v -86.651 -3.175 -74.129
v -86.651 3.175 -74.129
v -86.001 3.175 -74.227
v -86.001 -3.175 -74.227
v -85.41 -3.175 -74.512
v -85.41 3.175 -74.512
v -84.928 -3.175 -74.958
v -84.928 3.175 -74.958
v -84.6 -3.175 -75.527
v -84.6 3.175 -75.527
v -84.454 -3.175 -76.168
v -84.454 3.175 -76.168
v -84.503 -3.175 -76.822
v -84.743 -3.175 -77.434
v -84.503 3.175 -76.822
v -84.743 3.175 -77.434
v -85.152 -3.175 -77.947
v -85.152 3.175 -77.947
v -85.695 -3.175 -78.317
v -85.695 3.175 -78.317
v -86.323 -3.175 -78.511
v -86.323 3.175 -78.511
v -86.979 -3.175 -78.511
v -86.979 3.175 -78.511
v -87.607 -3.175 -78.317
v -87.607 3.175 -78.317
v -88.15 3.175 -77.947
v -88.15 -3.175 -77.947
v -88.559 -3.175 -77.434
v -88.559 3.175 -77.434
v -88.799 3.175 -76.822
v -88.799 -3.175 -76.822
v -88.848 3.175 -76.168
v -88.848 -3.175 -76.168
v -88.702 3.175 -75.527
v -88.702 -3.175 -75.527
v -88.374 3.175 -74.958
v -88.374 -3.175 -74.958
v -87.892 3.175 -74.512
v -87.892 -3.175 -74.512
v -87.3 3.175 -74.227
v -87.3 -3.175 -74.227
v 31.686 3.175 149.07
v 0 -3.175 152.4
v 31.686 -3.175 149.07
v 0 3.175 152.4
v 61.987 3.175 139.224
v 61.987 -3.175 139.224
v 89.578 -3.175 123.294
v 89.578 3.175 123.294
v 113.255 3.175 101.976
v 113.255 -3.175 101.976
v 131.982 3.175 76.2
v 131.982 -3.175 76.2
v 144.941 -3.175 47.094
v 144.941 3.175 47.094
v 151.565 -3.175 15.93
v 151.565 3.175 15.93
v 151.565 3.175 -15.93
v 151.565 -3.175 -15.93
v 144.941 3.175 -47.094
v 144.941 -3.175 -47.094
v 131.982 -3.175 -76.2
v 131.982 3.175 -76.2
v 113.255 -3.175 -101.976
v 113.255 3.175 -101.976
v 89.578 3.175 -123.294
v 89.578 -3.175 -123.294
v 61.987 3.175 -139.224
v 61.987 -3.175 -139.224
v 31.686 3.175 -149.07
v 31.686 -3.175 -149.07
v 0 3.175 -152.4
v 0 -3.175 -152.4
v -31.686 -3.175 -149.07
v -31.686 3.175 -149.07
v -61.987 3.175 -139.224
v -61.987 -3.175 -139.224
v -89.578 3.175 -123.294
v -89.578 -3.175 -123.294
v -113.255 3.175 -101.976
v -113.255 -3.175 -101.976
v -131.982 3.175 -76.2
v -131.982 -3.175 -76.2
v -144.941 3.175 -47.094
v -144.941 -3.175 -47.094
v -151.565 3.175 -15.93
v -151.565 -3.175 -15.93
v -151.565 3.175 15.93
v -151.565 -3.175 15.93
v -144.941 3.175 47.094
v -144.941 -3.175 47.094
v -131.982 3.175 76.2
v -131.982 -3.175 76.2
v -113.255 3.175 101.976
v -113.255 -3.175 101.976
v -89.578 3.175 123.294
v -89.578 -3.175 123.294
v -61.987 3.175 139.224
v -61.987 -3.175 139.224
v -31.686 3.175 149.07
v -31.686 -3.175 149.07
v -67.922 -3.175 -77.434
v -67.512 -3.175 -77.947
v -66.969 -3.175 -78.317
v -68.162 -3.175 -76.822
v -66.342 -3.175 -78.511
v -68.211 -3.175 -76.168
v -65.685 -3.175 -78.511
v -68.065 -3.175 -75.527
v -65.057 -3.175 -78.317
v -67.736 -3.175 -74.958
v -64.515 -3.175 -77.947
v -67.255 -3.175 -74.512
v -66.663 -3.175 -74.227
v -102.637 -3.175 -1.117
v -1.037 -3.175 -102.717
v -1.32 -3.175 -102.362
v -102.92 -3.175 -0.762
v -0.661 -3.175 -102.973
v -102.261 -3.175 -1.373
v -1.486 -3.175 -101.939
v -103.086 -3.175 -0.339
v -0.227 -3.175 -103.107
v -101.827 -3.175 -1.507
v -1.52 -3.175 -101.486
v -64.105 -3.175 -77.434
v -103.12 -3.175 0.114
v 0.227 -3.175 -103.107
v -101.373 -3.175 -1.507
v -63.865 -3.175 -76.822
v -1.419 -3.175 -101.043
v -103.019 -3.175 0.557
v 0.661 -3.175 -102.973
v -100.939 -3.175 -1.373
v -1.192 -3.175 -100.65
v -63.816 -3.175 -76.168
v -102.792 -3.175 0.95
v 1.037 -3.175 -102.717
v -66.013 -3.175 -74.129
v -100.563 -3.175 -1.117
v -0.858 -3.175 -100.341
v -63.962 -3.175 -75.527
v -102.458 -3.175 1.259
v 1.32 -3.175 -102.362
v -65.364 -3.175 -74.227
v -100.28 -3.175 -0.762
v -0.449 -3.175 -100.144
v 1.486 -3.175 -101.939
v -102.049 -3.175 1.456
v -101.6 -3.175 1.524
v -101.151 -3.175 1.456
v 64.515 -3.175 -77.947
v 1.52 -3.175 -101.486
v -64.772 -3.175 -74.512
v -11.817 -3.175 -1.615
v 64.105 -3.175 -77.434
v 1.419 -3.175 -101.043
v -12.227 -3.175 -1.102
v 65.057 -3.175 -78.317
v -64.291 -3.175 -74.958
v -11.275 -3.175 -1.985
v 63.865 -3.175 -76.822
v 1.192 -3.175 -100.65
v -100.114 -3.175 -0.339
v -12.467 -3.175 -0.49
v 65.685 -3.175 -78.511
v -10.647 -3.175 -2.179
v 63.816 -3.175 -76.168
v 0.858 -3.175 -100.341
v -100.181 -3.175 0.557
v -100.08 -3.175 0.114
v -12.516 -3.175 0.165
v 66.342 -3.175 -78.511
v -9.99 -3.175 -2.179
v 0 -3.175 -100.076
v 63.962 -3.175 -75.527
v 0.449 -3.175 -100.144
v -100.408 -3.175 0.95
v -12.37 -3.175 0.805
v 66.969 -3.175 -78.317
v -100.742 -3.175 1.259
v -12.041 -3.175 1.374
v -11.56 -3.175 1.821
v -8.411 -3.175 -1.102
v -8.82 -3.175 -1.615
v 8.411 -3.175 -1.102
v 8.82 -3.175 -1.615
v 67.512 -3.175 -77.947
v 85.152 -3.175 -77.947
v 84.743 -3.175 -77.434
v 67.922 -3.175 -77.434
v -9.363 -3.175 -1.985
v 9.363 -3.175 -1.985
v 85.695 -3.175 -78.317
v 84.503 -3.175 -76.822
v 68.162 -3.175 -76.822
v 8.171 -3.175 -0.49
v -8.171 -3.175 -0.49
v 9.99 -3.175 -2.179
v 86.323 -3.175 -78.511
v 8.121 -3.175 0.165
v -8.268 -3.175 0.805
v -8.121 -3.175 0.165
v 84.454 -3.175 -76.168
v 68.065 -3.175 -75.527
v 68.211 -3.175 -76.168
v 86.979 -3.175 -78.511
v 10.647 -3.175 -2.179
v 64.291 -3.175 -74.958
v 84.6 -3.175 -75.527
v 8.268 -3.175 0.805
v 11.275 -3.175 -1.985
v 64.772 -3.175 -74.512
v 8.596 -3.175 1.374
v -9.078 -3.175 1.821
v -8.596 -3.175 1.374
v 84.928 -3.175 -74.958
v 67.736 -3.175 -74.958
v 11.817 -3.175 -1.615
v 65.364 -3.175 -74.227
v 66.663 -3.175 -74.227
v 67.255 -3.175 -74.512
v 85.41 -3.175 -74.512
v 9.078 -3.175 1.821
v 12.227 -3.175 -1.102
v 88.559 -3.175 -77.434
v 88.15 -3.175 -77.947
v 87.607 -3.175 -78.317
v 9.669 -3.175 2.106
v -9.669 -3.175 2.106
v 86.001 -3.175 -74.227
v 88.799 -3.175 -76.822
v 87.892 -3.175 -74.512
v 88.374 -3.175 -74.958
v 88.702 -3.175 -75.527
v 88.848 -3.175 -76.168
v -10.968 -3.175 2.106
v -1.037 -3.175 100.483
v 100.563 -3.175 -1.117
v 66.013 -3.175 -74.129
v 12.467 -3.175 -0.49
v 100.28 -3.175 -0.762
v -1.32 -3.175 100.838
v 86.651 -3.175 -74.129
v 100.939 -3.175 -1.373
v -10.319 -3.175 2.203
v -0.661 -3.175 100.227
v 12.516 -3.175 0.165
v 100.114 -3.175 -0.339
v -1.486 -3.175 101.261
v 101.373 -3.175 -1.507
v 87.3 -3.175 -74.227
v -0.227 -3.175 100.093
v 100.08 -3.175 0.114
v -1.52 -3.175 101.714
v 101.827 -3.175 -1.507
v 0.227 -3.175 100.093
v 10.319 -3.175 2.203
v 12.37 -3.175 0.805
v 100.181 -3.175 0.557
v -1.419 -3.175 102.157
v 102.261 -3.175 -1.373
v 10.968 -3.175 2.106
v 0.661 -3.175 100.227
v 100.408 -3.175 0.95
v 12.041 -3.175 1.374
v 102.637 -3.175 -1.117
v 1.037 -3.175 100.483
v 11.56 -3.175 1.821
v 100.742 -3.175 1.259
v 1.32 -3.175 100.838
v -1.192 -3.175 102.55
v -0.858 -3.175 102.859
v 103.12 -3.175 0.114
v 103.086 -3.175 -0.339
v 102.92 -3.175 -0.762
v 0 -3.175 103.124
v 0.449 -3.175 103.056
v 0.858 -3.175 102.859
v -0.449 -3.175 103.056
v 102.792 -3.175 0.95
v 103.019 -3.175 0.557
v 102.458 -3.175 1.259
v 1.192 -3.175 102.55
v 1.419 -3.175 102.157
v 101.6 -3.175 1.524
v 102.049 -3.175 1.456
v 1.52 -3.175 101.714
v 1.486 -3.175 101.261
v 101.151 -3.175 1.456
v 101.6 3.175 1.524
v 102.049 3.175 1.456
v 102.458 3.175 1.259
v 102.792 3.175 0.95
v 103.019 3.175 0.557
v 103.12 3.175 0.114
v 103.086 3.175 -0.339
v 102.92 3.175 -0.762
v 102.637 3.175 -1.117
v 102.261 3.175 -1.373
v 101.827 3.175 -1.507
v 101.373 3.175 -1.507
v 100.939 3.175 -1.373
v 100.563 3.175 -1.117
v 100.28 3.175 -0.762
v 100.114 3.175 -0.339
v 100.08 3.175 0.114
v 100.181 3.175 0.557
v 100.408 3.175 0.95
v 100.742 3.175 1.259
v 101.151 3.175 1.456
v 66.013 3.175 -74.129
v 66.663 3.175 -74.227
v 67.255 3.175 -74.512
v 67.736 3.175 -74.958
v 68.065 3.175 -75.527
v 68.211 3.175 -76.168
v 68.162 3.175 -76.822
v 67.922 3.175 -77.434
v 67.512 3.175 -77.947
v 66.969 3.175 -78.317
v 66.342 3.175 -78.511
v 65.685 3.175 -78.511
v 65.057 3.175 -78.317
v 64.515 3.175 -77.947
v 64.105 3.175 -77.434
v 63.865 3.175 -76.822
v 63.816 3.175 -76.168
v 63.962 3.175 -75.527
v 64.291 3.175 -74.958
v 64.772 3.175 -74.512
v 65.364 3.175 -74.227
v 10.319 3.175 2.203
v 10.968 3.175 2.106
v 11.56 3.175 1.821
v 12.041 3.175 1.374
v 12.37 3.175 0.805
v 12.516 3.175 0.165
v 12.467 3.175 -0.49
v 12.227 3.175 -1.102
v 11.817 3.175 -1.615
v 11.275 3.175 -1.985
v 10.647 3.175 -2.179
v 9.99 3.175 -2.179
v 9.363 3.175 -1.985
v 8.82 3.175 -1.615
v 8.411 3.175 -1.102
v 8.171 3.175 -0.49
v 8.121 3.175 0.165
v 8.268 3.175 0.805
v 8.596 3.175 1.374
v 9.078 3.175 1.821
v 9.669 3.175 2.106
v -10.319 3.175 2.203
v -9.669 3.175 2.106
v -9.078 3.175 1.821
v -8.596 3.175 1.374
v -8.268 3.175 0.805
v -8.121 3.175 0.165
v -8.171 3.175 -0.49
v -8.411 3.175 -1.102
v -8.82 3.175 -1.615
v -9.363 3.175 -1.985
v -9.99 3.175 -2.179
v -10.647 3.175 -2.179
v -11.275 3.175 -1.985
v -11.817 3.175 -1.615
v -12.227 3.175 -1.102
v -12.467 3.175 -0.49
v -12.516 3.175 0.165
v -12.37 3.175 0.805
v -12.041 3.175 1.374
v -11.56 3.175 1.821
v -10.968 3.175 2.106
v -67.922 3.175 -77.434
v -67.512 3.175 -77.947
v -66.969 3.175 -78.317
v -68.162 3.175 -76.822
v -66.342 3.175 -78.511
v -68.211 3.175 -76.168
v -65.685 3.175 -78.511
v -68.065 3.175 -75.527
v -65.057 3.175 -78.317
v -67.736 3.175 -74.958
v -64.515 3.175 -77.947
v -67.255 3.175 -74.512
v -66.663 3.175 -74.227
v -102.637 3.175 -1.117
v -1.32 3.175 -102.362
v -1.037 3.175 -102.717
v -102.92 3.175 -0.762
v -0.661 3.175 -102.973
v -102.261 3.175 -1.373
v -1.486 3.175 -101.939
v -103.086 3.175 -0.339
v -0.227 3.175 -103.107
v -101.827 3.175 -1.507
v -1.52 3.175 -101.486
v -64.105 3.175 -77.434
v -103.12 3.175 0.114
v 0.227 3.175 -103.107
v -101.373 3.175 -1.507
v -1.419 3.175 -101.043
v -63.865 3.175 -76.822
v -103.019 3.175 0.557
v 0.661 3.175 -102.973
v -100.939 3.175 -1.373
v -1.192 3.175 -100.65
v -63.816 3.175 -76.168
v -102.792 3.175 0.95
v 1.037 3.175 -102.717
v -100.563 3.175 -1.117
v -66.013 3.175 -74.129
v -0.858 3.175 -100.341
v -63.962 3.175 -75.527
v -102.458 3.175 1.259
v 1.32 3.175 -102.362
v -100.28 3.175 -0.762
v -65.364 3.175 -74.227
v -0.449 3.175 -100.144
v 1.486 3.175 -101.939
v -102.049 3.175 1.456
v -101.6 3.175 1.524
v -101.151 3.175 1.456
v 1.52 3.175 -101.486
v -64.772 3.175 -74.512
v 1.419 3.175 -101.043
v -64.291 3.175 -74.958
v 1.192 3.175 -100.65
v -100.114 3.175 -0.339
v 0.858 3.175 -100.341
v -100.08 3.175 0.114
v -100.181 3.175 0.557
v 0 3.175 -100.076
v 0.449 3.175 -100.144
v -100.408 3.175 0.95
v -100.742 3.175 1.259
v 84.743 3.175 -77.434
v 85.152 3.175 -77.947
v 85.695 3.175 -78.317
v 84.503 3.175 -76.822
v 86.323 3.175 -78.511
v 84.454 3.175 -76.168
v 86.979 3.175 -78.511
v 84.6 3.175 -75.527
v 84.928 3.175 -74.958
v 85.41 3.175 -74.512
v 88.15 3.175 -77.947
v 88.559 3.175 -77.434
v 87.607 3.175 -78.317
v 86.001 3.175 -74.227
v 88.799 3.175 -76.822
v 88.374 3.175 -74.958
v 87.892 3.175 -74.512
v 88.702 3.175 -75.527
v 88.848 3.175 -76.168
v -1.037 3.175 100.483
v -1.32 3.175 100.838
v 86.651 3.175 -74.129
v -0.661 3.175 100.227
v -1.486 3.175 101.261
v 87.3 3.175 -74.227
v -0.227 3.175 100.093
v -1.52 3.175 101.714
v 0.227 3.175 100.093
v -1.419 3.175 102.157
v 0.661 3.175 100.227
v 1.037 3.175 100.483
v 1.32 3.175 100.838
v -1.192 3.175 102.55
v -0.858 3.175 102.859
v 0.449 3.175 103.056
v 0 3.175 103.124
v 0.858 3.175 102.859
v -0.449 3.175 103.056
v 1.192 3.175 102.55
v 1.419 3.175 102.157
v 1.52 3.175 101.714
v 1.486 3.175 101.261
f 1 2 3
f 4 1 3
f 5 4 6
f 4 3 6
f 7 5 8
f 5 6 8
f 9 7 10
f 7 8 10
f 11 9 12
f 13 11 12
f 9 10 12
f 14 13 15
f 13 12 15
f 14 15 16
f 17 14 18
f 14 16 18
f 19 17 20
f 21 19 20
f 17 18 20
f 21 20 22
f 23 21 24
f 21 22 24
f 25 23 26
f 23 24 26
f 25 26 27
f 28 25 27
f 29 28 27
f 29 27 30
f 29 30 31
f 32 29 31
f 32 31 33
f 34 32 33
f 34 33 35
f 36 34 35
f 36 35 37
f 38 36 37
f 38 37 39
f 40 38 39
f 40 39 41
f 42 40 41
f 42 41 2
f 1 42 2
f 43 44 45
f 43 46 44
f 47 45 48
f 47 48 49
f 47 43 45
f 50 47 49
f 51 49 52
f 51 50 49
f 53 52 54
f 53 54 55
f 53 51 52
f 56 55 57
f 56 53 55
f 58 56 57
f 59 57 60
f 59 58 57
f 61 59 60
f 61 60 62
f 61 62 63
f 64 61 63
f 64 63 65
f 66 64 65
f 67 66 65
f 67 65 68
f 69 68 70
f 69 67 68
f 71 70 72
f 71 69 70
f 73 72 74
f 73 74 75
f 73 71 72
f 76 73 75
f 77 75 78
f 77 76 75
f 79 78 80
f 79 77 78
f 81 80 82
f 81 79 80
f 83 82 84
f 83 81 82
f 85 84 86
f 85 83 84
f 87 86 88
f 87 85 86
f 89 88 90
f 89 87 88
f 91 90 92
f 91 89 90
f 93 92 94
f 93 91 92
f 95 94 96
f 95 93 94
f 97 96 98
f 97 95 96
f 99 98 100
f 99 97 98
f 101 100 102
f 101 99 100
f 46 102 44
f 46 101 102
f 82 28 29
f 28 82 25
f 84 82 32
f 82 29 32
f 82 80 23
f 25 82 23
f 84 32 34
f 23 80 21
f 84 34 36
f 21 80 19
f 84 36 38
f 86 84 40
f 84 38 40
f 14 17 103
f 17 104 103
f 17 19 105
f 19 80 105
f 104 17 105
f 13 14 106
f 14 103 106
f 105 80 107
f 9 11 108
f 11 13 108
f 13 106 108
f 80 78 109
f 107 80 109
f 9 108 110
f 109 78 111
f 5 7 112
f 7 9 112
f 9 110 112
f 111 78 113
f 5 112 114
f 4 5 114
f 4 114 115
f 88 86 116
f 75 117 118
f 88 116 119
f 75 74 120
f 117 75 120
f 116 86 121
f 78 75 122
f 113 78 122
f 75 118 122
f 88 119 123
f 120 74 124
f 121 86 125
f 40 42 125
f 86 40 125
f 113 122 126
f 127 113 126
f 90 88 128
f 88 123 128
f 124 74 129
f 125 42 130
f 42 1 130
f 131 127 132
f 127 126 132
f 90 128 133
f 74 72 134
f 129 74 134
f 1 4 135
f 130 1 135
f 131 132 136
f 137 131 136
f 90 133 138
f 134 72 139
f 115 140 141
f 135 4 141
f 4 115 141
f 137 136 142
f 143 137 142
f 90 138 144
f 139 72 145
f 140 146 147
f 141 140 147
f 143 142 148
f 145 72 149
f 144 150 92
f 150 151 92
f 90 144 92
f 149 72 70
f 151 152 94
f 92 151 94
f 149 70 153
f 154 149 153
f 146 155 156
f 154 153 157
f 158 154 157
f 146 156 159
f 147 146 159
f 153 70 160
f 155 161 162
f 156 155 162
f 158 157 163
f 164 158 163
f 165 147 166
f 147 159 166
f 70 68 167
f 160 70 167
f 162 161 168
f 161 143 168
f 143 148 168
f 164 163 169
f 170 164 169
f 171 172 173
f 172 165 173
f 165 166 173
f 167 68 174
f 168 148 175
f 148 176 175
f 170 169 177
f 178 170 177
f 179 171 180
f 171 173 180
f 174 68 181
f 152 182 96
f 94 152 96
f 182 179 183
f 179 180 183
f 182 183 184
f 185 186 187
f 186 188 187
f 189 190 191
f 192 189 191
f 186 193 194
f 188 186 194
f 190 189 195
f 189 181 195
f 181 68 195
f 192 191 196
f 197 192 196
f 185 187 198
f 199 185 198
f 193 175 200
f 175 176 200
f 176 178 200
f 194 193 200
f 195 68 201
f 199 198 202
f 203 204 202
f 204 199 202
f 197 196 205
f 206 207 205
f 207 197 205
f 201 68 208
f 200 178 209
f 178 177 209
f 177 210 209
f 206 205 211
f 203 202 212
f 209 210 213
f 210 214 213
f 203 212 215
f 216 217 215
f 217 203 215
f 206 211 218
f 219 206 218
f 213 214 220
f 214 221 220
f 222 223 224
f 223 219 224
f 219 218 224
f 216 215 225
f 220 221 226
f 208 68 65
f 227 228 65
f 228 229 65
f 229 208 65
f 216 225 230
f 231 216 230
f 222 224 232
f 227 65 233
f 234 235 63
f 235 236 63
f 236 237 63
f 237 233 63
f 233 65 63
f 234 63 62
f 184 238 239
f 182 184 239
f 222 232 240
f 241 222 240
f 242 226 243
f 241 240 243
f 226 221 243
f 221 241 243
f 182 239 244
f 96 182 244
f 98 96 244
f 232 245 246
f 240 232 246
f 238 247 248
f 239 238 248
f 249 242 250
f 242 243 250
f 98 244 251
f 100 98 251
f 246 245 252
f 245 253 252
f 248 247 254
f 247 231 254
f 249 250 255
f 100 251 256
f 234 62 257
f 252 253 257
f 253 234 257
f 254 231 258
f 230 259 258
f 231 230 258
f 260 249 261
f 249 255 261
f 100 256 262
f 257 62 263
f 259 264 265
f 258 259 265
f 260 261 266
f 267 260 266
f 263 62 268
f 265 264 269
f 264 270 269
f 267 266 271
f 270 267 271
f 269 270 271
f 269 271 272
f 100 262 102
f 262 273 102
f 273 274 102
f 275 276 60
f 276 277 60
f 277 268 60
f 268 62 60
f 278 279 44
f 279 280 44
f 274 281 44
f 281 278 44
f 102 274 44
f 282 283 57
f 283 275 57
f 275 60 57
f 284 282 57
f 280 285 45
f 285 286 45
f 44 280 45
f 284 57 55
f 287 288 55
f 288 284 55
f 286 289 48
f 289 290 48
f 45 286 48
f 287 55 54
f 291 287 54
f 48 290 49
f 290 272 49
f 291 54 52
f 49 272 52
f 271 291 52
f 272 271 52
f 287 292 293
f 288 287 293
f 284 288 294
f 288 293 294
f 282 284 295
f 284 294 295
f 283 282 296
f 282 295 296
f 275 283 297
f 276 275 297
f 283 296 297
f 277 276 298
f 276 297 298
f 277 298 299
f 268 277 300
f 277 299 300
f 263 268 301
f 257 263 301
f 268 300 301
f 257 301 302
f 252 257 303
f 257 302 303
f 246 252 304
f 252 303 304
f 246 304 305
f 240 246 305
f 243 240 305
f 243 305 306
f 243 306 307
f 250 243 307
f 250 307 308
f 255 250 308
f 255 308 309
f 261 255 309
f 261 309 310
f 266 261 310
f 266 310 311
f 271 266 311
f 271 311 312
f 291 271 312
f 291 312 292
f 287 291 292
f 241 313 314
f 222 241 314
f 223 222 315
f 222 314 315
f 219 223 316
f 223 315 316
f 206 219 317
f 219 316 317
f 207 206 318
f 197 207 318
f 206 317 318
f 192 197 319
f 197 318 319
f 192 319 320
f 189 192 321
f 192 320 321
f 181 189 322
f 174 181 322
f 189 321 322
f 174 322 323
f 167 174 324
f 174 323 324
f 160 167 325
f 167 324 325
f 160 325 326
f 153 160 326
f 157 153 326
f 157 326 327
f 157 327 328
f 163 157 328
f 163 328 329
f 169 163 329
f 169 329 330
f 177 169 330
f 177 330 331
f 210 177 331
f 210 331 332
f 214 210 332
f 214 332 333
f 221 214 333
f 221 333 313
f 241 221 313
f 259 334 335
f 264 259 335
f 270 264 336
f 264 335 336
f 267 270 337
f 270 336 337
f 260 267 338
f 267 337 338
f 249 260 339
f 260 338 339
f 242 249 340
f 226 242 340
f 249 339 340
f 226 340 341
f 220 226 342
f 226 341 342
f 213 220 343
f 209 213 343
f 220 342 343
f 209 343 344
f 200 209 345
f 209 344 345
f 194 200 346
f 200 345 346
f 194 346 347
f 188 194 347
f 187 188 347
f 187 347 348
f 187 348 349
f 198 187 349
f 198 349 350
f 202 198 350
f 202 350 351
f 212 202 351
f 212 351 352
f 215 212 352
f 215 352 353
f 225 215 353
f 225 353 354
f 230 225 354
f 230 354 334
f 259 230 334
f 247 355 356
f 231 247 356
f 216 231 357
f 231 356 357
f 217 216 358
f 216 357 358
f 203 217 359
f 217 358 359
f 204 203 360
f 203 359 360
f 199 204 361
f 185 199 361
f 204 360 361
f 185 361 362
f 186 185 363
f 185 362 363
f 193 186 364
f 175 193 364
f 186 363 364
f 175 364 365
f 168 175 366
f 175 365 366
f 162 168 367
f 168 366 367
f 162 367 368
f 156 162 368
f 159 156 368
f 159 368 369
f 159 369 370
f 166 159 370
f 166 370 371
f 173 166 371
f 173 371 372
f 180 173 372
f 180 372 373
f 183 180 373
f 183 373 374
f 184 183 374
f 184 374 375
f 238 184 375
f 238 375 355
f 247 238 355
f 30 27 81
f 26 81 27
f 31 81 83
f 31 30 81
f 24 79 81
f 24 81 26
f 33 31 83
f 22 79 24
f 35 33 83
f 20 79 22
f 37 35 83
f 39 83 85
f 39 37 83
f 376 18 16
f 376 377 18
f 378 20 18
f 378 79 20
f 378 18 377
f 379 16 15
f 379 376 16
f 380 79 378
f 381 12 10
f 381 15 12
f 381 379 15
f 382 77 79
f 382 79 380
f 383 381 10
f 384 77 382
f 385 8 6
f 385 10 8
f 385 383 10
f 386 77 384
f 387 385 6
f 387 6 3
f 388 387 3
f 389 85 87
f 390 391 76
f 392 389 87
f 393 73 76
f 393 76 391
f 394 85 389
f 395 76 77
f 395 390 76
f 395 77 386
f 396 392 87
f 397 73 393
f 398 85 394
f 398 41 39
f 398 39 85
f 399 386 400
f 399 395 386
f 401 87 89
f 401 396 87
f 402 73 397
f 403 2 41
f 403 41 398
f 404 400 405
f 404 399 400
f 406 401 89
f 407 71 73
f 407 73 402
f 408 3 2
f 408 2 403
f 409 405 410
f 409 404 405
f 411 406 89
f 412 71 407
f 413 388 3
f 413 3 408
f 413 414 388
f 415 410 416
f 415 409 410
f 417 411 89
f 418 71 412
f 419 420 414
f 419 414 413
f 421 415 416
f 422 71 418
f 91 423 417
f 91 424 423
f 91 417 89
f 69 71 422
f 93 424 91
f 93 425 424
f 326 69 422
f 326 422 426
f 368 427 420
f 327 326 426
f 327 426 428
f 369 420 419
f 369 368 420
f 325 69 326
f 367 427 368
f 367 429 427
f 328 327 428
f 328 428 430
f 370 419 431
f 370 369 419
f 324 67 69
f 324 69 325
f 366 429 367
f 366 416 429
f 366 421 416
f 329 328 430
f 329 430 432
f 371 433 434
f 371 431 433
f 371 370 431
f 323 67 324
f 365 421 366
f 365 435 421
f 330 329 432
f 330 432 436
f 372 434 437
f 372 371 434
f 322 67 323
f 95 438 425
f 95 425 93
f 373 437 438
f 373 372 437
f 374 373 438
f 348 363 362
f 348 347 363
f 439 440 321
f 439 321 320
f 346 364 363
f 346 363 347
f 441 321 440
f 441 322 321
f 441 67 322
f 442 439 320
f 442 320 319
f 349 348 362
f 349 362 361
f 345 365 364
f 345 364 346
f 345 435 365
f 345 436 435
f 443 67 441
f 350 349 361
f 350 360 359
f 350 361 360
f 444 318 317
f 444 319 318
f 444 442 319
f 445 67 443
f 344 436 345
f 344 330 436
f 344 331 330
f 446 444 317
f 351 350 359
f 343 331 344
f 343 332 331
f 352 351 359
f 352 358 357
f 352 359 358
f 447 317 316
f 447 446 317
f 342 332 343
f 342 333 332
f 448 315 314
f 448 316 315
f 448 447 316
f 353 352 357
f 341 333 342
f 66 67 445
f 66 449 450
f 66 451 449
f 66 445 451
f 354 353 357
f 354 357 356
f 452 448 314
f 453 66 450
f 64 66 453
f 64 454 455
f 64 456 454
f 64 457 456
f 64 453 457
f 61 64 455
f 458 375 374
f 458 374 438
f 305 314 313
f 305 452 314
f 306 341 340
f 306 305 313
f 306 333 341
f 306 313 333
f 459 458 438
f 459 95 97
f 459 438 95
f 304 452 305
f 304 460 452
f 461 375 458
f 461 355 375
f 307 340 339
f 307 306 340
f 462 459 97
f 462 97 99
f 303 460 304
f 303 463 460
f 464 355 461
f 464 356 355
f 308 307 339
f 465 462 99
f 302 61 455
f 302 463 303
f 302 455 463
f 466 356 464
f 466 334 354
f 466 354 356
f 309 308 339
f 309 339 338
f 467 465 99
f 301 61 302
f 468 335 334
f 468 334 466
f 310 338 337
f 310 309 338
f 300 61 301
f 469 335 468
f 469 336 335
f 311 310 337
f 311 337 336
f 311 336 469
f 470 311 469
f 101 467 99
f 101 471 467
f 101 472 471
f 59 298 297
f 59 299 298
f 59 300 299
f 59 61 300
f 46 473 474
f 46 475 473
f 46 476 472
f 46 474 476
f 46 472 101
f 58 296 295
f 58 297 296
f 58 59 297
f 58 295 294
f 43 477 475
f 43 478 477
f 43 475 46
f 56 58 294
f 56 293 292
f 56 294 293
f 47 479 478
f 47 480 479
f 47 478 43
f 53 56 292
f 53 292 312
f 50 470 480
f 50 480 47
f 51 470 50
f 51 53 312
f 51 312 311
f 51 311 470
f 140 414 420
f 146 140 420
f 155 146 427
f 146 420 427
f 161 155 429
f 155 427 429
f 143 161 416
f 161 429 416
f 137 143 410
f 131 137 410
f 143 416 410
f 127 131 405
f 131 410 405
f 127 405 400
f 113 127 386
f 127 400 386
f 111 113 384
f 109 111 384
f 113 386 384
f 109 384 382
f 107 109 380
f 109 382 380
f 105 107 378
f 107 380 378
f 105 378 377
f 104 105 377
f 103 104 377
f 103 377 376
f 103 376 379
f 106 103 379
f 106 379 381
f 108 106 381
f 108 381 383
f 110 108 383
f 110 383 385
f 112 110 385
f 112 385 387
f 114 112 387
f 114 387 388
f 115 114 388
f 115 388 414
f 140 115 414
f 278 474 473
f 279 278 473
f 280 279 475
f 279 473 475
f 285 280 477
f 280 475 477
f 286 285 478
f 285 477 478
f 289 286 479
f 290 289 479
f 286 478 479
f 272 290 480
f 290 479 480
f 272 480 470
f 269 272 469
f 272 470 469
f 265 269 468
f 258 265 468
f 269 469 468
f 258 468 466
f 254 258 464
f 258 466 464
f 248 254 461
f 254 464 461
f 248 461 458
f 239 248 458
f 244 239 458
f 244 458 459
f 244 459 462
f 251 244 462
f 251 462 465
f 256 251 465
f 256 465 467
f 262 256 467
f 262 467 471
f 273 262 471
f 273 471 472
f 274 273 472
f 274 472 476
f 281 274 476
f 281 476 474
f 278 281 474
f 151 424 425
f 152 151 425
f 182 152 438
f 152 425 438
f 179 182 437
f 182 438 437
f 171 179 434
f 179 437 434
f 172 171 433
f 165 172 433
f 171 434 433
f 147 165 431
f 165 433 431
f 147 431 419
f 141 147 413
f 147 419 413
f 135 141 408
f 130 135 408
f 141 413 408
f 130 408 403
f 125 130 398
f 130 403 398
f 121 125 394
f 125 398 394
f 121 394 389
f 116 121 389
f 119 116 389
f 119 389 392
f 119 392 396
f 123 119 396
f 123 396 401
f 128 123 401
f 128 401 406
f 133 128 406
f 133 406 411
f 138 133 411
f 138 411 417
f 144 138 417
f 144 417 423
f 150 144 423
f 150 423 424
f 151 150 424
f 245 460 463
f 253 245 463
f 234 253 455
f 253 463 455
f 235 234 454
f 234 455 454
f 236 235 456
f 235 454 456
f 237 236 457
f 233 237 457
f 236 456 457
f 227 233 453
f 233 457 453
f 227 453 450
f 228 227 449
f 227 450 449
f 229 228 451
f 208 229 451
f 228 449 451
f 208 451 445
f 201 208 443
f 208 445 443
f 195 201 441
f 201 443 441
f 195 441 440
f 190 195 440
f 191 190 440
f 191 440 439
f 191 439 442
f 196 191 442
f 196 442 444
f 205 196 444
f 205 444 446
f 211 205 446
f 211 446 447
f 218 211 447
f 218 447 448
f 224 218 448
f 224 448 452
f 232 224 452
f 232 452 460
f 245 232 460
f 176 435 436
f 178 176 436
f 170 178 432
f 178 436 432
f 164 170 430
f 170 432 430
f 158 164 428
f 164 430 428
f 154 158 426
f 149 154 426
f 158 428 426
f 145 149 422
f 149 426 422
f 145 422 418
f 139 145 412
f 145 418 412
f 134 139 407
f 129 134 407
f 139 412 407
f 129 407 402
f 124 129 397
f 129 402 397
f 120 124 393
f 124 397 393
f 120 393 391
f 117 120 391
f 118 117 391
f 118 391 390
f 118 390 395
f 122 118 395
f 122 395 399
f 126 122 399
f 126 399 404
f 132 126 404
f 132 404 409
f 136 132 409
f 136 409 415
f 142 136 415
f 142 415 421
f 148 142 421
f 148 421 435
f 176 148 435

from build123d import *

# Parameters (mm, degrees)
SKETCH1_R           = 152.4
BOSS_EXTRUDE1_DEPTH = 3.175
SKETCH3_R           = 2.20345
CUT_EXTRUDE1_DEPTH  = 216.619670949
SKETCH5_R           = 1.524
CUT_EXTRUDE3_DEPTH  = 216.619670949


with BuildPart() as part:
    # Sketch1 → Boss-Extrude1 (new, symmetric)
    with BuildSketch(Plane(origin=(0, 0, 0), x_dir=(1, 0, 0), z_dir=(0, 1, 0))):
        with Locations(Location((0, 0, 0), (0, 0, 270))):
            Circle(SKETCH1_R)
    extrude(amount=BOSS_EXTRUDE1_DEPTH, both=True)

    # Sketch3 → Cut-Extrude1 (cut, through all)
    with BuildSketch(Plane(origin=(0, 3.175, 0), x_dir=(1, 0, 0), z_dir=(0, 1, 0))):
        with Locations(Location((-10.31875, 0, 0), (0, 0, 270))):
            Circle(SKETCH3_R)
        with Locations(Location((10.31875, 0, 0), (0, 0, 270))):
            Circle(SKETCH3_R)
        with Locations(Location((66.013427029, 76.332177029, 0), (0, 0, 270))):
            Circle(SKETCH3_R)
        with Locations(Location((86.650927029, 76.332177029, 0), (0, 0, 270))):
            Circle(SKETCH3_R)
        with Locations(Location((-86.650927029, 76.332177029, 0), (0, 0, 270))):
            Circle(SKETCH3_R)
        with Locations(Location((-66.013427029, 76.332177029, 0), (0, 0, 270))):
            Circle(SKETCH3_R)
    extrude(amount=-CUT_EXTRUDE1_DEPTH, mode=Mode.SUBTRACT)

    # Sketch5 → Cut-Extrude3 (cut, through all)
    with BuildSketch(Plane(origin=(0, 3.175, 0), x_dir=(1, 0, 0), z_dir=(0, 1, 0))):
        with Locations(Location((-101.6, 0, 0), (0, 0, 270))):
            Circle(SKETCH5_R)
        with Locations(Location((0, 101.6, 0), (0, 0, 270))):
            Circle(SKETCH5_R)
        with Locations(Location((101.6, 0, 0), (0, 0, 270))):
            Circle(SKETCH5_R)
        with Locations(Location((0, -101.6, 0), (0, 0, 270))):
            Circle(SKETCH5_R)
    extrude(amount=-CUT_EXTRUDE3_DEPTH, mode=Mode.SUBTRACT)


solid = part.part
